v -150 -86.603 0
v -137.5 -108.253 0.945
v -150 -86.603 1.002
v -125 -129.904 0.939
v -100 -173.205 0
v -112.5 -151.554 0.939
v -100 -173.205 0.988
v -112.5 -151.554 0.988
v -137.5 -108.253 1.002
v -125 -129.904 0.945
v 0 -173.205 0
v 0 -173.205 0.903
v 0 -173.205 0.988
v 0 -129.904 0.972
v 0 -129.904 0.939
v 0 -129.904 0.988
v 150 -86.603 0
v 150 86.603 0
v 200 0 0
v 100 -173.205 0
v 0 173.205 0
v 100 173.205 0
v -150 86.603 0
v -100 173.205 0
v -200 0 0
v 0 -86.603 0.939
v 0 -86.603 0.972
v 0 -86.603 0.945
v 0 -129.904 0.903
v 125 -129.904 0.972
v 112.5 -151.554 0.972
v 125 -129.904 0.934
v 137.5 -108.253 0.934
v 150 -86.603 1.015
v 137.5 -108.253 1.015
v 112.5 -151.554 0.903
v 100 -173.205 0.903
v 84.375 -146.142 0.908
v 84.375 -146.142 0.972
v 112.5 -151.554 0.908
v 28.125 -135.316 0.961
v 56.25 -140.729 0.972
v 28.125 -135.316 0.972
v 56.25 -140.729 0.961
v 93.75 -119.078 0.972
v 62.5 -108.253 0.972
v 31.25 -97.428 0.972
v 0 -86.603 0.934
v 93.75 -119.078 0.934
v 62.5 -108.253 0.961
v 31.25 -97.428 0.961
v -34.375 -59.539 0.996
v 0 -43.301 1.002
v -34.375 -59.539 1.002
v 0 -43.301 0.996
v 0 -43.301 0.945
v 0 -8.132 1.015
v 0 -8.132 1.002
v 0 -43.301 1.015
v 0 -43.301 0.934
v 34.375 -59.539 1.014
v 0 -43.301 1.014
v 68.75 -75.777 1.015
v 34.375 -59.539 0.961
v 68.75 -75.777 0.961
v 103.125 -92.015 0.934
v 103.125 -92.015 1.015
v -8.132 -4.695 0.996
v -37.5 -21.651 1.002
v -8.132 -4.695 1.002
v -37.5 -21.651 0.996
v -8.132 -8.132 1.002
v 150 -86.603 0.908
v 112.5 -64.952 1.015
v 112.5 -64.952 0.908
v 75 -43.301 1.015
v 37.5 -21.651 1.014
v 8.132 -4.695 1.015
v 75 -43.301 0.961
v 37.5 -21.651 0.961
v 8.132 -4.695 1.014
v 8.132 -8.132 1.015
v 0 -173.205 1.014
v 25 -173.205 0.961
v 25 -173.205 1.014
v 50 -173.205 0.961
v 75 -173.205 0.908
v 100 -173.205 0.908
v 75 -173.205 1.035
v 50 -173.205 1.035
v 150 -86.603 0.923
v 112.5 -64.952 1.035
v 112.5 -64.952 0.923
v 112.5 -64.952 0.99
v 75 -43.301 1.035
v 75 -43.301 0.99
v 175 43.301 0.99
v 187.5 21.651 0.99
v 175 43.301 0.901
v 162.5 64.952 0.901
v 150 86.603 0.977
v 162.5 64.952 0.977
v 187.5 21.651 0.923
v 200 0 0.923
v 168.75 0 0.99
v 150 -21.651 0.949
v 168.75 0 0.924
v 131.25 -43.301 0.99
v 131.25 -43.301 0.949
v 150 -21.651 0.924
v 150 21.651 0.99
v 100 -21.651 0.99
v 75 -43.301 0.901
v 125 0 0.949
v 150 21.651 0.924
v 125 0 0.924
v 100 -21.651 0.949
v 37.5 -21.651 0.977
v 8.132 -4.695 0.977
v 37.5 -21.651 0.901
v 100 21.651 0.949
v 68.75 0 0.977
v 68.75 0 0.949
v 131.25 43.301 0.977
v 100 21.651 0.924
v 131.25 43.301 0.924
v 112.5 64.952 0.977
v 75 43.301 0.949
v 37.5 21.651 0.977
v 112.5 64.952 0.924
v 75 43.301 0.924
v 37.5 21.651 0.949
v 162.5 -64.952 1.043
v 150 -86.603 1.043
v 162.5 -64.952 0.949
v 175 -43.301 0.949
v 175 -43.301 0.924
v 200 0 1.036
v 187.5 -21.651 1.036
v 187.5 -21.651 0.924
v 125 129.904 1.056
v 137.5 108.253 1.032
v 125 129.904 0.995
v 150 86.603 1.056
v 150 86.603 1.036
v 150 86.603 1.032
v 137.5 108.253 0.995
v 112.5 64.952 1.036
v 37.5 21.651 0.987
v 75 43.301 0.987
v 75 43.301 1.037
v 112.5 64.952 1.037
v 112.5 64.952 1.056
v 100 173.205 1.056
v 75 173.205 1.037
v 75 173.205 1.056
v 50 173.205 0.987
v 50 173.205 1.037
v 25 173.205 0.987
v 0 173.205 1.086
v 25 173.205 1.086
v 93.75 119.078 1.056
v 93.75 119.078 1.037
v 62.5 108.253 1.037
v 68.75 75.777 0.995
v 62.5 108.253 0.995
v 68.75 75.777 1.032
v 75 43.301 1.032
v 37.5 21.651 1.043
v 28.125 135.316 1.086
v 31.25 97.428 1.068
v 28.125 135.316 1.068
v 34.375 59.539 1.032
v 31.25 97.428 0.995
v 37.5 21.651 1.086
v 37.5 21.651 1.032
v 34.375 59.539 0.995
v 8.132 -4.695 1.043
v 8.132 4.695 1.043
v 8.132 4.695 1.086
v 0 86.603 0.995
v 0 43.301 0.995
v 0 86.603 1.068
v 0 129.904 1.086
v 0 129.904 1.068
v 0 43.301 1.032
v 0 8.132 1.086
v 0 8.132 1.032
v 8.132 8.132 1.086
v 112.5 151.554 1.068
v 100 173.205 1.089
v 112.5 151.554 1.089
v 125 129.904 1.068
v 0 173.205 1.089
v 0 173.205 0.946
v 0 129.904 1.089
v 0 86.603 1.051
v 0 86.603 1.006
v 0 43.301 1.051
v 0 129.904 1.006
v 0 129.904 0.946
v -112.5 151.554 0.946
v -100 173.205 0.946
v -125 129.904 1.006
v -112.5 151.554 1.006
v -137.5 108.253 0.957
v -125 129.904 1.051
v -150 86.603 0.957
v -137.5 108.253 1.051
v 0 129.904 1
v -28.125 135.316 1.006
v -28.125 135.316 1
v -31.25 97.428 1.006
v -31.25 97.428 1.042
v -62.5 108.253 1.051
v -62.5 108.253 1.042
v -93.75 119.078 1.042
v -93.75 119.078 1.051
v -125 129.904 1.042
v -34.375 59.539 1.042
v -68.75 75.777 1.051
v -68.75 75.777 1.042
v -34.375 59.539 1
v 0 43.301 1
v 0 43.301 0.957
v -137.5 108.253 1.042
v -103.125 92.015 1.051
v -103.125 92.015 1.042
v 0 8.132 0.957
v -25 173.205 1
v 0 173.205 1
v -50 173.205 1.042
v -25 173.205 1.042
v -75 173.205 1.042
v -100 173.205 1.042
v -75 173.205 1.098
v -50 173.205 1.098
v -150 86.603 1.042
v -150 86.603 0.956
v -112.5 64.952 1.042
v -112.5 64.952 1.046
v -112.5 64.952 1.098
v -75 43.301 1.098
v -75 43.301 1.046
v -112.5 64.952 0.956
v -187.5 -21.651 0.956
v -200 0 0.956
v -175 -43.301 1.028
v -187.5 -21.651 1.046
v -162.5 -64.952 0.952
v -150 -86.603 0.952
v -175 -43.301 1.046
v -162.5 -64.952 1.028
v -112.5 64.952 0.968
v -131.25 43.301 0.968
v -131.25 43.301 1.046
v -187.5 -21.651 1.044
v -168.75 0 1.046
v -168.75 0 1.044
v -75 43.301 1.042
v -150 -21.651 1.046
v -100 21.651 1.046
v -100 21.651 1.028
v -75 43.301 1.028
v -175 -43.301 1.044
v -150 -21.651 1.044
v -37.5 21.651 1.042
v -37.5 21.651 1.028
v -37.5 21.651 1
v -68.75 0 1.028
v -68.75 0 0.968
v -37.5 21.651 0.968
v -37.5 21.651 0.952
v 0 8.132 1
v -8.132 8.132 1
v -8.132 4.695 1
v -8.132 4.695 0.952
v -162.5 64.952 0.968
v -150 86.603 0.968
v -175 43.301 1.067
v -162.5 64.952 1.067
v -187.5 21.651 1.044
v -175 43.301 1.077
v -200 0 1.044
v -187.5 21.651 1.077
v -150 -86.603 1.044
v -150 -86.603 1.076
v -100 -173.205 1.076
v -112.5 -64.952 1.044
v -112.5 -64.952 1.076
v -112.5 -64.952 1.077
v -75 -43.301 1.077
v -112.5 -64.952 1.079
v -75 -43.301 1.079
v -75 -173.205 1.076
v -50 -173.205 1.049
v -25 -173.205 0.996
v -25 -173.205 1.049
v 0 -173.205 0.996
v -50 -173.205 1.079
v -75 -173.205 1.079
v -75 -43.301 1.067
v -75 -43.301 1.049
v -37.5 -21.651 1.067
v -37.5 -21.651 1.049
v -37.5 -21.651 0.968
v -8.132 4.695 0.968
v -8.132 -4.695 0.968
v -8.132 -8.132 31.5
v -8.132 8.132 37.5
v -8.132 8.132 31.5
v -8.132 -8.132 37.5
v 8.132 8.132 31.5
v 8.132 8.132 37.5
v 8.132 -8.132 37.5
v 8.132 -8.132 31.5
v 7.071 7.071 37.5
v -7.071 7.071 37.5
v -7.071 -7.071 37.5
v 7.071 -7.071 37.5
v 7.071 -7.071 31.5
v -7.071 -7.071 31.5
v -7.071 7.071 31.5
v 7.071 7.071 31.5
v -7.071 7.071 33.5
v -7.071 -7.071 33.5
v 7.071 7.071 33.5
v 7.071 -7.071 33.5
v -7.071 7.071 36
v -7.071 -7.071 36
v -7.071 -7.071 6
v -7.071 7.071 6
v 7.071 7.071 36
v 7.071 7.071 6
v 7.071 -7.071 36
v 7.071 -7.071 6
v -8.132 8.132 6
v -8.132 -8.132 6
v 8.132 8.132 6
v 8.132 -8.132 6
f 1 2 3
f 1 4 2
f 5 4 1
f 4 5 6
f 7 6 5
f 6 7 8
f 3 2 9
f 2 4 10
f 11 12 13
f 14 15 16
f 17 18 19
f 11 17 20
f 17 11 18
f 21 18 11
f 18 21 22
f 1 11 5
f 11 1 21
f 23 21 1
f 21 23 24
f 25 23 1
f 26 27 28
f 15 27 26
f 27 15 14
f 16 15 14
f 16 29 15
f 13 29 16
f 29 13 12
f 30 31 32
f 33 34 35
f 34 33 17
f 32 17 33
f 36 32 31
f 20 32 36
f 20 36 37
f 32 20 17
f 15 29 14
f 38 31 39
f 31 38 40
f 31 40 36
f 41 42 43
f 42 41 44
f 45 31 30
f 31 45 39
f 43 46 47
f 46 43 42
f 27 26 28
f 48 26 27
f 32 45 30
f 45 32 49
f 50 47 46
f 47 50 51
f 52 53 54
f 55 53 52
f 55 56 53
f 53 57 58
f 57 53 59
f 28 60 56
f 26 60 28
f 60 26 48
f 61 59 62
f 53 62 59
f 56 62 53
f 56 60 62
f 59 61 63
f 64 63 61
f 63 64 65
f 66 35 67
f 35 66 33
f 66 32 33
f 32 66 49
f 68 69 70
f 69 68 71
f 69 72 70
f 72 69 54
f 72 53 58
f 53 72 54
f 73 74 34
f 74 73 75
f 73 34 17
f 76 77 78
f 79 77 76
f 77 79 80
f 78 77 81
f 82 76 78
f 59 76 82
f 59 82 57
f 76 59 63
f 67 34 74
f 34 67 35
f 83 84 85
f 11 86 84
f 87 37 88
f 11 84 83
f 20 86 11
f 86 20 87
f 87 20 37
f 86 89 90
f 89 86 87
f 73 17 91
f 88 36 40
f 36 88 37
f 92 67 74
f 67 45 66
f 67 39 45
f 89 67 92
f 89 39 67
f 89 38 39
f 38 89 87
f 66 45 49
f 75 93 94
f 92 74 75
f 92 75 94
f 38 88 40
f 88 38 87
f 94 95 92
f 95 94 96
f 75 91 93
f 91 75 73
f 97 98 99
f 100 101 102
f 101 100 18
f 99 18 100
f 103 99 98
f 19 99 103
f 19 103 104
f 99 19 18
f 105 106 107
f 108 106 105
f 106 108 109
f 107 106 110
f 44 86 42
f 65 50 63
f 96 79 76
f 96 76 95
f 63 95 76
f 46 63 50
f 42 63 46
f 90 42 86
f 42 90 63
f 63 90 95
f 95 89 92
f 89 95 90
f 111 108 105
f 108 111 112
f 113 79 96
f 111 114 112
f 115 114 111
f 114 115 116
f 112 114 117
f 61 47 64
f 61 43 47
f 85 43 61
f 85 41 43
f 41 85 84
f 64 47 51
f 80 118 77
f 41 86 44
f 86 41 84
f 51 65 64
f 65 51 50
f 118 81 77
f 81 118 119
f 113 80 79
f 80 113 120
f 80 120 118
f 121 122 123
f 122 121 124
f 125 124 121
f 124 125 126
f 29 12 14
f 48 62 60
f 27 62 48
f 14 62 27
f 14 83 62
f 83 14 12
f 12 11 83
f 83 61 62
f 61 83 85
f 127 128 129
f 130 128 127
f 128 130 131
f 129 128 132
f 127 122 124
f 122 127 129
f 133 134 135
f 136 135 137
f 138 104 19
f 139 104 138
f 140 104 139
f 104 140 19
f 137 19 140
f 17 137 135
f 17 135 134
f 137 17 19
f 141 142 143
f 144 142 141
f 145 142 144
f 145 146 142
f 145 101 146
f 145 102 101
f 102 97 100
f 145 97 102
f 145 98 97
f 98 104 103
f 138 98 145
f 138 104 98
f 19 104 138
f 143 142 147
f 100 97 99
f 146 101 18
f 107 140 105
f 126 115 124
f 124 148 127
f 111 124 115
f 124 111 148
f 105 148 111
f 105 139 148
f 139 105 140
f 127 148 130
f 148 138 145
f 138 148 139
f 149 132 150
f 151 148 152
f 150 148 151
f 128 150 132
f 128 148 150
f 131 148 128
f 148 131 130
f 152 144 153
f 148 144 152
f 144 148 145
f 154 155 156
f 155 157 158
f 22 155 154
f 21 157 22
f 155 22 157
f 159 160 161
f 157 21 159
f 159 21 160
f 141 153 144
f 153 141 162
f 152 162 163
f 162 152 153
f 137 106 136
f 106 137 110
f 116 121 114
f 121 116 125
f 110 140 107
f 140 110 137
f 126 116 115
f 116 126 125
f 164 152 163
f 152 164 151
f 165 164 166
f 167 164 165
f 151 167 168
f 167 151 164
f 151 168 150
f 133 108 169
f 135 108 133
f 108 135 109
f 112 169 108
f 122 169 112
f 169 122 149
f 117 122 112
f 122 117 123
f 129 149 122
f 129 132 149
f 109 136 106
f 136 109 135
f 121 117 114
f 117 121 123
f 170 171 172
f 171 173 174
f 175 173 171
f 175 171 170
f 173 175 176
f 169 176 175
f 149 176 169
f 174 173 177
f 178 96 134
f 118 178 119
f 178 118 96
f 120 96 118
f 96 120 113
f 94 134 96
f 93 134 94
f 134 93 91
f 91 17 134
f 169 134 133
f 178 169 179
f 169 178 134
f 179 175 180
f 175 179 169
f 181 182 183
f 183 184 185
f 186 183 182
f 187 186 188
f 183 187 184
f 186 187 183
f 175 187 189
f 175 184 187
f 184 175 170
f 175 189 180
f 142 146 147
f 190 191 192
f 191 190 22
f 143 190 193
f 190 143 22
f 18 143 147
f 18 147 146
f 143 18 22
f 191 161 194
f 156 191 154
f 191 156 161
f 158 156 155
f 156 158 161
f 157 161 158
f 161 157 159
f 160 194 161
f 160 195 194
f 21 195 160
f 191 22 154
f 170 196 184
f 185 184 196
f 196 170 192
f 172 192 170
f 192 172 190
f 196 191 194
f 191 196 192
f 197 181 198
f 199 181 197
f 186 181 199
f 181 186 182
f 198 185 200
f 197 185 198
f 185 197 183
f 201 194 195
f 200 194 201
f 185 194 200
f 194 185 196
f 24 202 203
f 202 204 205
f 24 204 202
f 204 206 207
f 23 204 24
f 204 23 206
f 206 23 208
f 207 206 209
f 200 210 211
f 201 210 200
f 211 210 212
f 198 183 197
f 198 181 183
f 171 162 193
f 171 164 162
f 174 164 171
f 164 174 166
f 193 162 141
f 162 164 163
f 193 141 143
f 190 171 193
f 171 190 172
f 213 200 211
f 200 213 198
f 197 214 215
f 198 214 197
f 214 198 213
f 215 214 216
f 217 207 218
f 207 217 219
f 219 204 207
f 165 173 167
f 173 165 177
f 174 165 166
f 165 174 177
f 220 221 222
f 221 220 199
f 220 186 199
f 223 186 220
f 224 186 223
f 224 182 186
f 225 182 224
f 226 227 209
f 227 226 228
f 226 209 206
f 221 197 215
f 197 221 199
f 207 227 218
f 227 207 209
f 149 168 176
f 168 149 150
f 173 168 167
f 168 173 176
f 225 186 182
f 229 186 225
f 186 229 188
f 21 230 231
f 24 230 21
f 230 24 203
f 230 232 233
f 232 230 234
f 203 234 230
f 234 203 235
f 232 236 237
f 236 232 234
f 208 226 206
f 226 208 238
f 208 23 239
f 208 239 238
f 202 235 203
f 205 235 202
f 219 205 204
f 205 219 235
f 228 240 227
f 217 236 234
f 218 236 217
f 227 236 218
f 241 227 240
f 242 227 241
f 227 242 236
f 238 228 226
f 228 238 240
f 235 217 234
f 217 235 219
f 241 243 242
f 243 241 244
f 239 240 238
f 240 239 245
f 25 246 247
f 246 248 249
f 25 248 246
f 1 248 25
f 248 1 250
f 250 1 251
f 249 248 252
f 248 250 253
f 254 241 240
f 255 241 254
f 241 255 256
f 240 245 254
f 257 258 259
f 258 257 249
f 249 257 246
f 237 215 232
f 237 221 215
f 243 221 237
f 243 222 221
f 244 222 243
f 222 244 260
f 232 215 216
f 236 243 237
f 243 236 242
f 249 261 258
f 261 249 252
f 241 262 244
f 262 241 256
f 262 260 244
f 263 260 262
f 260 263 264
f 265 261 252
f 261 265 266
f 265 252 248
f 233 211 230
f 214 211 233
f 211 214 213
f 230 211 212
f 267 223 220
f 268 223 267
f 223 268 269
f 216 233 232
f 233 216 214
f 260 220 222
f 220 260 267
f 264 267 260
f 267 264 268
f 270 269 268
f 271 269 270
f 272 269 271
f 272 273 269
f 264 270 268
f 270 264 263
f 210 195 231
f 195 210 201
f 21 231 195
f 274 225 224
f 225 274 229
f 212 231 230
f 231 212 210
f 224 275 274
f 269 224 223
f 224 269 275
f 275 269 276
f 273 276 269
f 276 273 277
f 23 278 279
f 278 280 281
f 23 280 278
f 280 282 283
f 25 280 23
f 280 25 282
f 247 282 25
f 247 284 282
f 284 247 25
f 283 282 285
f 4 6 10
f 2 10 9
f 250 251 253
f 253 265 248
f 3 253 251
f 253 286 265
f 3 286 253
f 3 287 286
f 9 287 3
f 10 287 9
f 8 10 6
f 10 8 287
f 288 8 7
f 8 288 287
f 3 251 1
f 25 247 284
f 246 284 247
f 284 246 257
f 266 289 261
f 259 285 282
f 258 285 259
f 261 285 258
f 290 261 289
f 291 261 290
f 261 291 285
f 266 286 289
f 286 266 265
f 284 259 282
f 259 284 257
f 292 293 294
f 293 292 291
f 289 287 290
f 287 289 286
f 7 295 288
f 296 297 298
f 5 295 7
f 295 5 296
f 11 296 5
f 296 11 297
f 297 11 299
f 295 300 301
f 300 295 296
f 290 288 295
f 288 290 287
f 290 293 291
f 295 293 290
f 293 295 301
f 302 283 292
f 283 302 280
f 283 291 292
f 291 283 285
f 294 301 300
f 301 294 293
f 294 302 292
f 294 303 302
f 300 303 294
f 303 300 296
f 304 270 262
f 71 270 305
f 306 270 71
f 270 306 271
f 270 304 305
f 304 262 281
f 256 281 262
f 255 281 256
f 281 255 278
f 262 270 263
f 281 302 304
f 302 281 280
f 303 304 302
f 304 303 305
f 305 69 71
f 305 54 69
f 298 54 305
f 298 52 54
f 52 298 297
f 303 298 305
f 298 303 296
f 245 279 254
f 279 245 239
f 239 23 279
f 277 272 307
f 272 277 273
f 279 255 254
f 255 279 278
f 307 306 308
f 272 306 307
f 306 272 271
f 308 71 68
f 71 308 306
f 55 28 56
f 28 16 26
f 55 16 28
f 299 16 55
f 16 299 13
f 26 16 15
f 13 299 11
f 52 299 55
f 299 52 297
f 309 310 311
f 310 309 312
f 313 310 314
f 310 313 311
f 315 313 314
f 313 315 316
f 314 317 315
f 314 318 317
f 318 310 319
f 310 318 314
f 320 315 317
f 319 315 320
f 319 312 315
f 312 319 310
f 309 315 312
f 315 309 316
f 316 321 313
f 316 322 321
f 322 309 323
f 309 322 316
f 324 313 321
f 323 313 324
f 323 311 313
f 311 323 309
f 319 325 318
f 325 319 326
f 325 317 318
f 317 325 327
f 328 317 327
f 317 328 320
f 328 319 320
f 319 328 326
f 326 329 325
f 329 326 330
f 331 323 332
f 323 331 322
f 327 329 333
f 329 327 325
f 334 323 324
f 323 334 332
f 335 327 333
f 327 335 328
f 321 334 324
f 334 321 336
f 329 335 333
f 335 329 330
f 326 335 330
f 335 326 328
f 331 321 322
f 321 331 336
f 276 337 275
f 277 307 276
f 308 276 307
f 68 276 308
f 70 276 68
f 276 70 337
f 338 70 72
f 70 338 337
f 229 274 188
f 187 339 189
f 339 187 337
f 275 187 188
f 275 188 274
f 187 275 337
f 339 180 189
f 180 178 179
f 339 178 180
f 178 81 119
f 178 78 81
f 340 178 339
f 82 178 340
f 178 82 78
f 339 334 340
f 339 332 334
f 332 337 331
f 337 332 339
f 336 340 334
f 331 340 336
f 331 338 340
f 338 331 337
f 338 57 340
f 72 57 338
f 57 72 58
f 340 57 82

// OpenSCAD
kantenlaenge=200;
eckendurchmesser=2*kantenlaenge;
kante_bis_mitte=sqrt(kantenlaenge*kantenlaenge-(kantenlaenge/2)*(kantenlaenge/2)); 
echo(kante_bis_mitte);
kantendurchmesser = kante_bis_mitte*2;
feldhoehe = kante_bis_mitte/4;
feldbreite_grundlinie=kantenlaenge/8;
feldreieckhoehe=sqrt(feldhoehe*feldhoehe-feldhoehe/2*feldhoehe/2);
epsilon=0.01;
  

module dot(){
//color("red")
//circle(1,$fn=20);    
}

module speiche(){
    translate([0,-feldhoehe*0]) dot();
    translate([0,-feldhoehe*1]) dot();
    translate([0,-feldhoehe*2]) dot();
    translate([0,-feldhoehe*3]) dot();
    translate([0,-feldhoehe*4]) dot();
}


module viereck_1(){
        linear_extrude(rands(.9,1.1,1)[0])
            polygon([
           [0,0],
           [-4*feldbreite_grundlinie,0],
           [-4.5*feldbreite_grundlinie,kante_bis_mitte/8],
           [0,feldhoehe],
           [0,0]
        ]);
}


module viereck_2(){
        linear_extrude(rands(.9,1.1,1)[0])
            polygon([
           [0,feldhoehe],
           [-4.5*feldbreite_grundlinie,kante_bis_mitte/8],
           [-5*feldbreite_grundlinie,2*kante_bis_mitte/8],
           [0,2*feldhoehe],
           [0,feldhoehe]
        ]);
}


module viereck_3(){
        linear_extrude(rands(.9,1.1,1)[0])
            polygon([
           [0,2*feldhoehe],
           [-5*feldbreite_grundlinie,2*kante_bis_mitte/8],
           [-5.5*feldbreite_grundlinie,3*kante_bis_mitte/8],
           [0,3*feldhoehe],
           [0,2*feldhoehe]
        ]);
}



module viereck_4(){
        linear_extrude(rands(.9,1.1,1)[0])
            polygon([
           [0,3*feldhoehe],
           [-5.5*feldbreite_grundlinie,3*kante_bis_mitte/8],
           [-6*feldbreite_grundlinie,4*kante_bis_mitte/8],
           [0,4*feldhoehe],
           [0,4*feldhoehe]
        ]);
}

module grundlinie(){ 
    translate([0,-feldhoehe*4]){
        translate([-4*feldbreite_grundlinie,0]) dot();
        translate([-3*feldbreite_grundlinie,0]) dot();
        translate([-2*feldbreite_grundlinie,0]) dot();
        translate([-1*feldbreite_grundlinie,0]) dot();
        translate([-0*feldbreite_grundlinie,0]) dot();
//        
        translate([-4.5*feldbreite_grundlinie,kante_bis_mitte/8]) dot();
        translate([-5*feldbreite_grundlinie,2*kante_bis_mitte/8]) dot();
        translate([-5.5*feldbreite_grundlinie,3*kante_bis_mitte/8]) dot();
        translate([-6*feldbreite_grundlinie,4*kante_bis_mitte/8]) dot();
        color("green",.3)
            viereck_1();
        color("blue",.3)
        mirror([1,0])
            viereck_1();
//        
        color("blue",.3)
            viereck_2();
        color("green",.3)
        mirror([1,0])
            viereck_2();
//            
        color("green",.3)
            viereck_3();
        color("blue",.3)
        mirror([1,0])
            viereck_3();
    
        color("blue",.3)
            viereck_4();
        color("green",.3)
        mirror([1,0])
            viereck_4();
//        
}
}

for (i=[0:5]){
    rotate([0,0,i*60]){
       speiche();
       grundlinie();
    }
}


pawnheight=35;
officer_height=45;
royalty_height=55;
pawnbase_diameter=15;
pawnhead_diameter=12;
officerhead_diameter=15;
officer_base_diameter=20;

module pawn(){
    cylinder(d1=pawnbase_diameter,d2=0,h=pawnheight);
    translate([0,0,pawnheight-pawnhead_diameter/2]) 
        sphere(d=pawnhead_diameter);
}


module bishop(){
    cylinder(d1=officer_base_diameter,d2=0,h=officer_height);
    translate([0,0,officer_height-officerhead_diameter/2]) 
        difference(){
            sphere(d=officerhead_diameter);
            translate([-5,0,5])
            rotate([0,60,0])
            cylinder(d=20,h=2);
        }
}


module knight(){
    cylinder(d1=officer_base_diameter,d2=0,h=officer_height*.8);
    hull(){
    translate([0,0,officer_height*.7]) 
        sphere(d=officerhead_diameter);
    translate([0,12,officer_height-officerhead_diameter/2-15]) 
        sphere(d=6,$fn=8);
    }
    translate([2.5,5,officer_height-officerhead_diameter/2-3]) 
        sphere(d=4,$fn=80);
    translate([-2.5,5,officer_height-officerhead_diameter/2-3]) 
        sphere(d=4,$fn=80);
}


module rook(){
    rotate([0,0,45])
    cylinder(d1=officer_base_diameter,d2=officer_base_diameter,h=officer_height*.8,$fn=4); 
    rotate([0,0,45])
    cylinder(h=6,d=officer_base_diameter+3,$fn=4);
    translate([0,0,officer_height*.7])
        rotate([0,0,45])
        difference(){
            cylinder(h=6,d=officer_base_diameter+3,$fn=4);
            translate([0,0,2])
            cylinder(h=6,d=officer_base_diameter,$fn=4);
        }
}

module king(){
    cylinder(d1=officer_base_diameter,d2=officer_base_diameter,h=royalty_height);
    translate([0,0,pawnheight+pawnhead_diameter/2]) 
        cylinder(d=officerhead_diameter+15,h=10);    
    translate([0,0,pawnheight+pawnhead_diameter+12])
        rotate([90,0,0])
            union(){
            difference(){
                cylinder(d=15,h=3,center=true,$fn=12);
                translate([3,3,-6/2])
                    cylinder(d=3,h=6,$fn=8);
                translate([3,-3,-6/2])
                    cylinder(d=3,h=6,$fn=8);
                translate([-3,3,-6/2])
                    cylinder(d=3,h=6,$fn=8);
                translate([-3,-3,-6/2])
                    cylinder(d=3,h=4,$fn=8);
            }   
            rotate([0,90,0])
                difference(){
                    cylinder(d=15,h=3,center=true,$fn=12);
                    translate([3,3,-6/2])
                        cylinder(d=3,h=6,$fn=8);
                    translate([3,-3,-6/2])
                        cylinder(d=3,h=6,$fn=8);
                    translate([-3,3,-6/2])
                        cylinder(d=3,h=6,$fn=8);
                    translate([-3,-3,-6/2])
                        cylinder(d=3,h=6,$fn=8);
                }    
        }           
}


module queen(){
    cylinder(d1=officer_base_diameter,d2=officer_base_diameter,h=royalty_height); 
    translate([0,0,pawnheight+pawnhead_diameter-13]) 
        cylinder(d1=officerhead_diameter,d2=officerhead_diameter+15,h=20,$fn=6);
}

module aufstellung(){ 

translate([-kantenlaenge/2+officer_base_diameter/2,-kante_bis_mitte+officer_base_diameter/2+2]) 
    rook();
translate([kantenlaenge/2-officer_base_diameter/2,-kante_bis_mitte+officer_base_diameter/2+2]) 
    rook();

translate([-kantenlaenge/2+feldbreite_grundlinie+officer_base_diameter/2,-kante_bis_mitte+officer_base_diameter/2+4]) 
    bishop();
translate([kantenlaenge/2-feldbreite_grundlinie-officer_base_diameter/2,-kante_bis_mitte+officer_base_diameter/2+4]) 
    bishop();

translate([kantenlaenge/2-2*feldbreite_grundlinie-officer_base_diameter/2,-kante_bis_mitte+officer_base_diameter/2+8]) 
    knight();
translate([-kantenlaenge/2+2*feldbreite_grundlinie+officer_base_diameter/2,-kante_bis_mitte+officer_base_diameter/2+8]) 
    knight();

translate([kantenlaenge/2-3*feldbreite_grundlinie-officer_base_diameter/2,-kante_bis_mitte+officer_base_diameter/2+10]) 
    king();    
translate([-kantenlaenge/2+3*feldbreite_grundlinie+officer_base_diameter/2,-kante_bis_mitte+officer_base_diameter/2+10]) 
    queen();
 
 
 
translate([-kantenlaenge/2+3*feldbreite_grundlinie+officer_base_diameter/2,-kante_bis_mitte+feldhoehe+officer_base_diameter/2+5]) 
    pawn();
translate([-kantenlaenge/2+2*feldbreite_grundlinie+officer_base_diameter/2-4,-kante_bis_mitte+feldhoehe+officer_base_diameter/2-2]) 
    pawn();
translate([-kantenlaenge/2+1*feldbreite_grundlinie+officer_base_diameter/2-9,-kante_bis_mitte+feldhoehe+officer_base_diameter/2-9]) 
    pawn();
translate([-kantenlaenge/2+0*feldbreite_grundlinie+officer_base_diameter/2-12,-kante_bis_mitte+feldhoehe+officer_base_diameter/2-16]) 
    pawn();
// 
translate([kantenlaenge/2-3*feldbreite_grundlinie-officer_base_diameter/2,-kante_bis_mitte+feldhoehe+officer_base_diameter/2+5]) 
    pawn();
translate([kantenlaenge/2-2*feldbreite_grundlinie-officer_base_diameter/2+4,-kante_bis_mitte+feldhoehe+officer_base_diameter/2-2]) 
    pawn();
translate([kantenlaenge/2-1*feldbreite_grundlinie-officer_base_diameter/2+9,-kante_bis_mitte+feldhoehe+officer_base_diameter/2-9]) 
    pawn();
translate([kantenlaenge/2-0*feldbreite_grundlinie-officer_base_diameter/2+12,-kante_bis_mitte+feldhoehe+officer_base_diameter/2-16]) 
    pawn();
    
}


//color("grey")
//aufstellung();
//
//color("brown")
//rotate([0,0,120])
//    aufstellung();
//
//color("beige")
//rotate([0,0,-120])
//    aufstellung();

rook();


//translate([-100,-10]) 
//    pawn();

//bishop();
 
